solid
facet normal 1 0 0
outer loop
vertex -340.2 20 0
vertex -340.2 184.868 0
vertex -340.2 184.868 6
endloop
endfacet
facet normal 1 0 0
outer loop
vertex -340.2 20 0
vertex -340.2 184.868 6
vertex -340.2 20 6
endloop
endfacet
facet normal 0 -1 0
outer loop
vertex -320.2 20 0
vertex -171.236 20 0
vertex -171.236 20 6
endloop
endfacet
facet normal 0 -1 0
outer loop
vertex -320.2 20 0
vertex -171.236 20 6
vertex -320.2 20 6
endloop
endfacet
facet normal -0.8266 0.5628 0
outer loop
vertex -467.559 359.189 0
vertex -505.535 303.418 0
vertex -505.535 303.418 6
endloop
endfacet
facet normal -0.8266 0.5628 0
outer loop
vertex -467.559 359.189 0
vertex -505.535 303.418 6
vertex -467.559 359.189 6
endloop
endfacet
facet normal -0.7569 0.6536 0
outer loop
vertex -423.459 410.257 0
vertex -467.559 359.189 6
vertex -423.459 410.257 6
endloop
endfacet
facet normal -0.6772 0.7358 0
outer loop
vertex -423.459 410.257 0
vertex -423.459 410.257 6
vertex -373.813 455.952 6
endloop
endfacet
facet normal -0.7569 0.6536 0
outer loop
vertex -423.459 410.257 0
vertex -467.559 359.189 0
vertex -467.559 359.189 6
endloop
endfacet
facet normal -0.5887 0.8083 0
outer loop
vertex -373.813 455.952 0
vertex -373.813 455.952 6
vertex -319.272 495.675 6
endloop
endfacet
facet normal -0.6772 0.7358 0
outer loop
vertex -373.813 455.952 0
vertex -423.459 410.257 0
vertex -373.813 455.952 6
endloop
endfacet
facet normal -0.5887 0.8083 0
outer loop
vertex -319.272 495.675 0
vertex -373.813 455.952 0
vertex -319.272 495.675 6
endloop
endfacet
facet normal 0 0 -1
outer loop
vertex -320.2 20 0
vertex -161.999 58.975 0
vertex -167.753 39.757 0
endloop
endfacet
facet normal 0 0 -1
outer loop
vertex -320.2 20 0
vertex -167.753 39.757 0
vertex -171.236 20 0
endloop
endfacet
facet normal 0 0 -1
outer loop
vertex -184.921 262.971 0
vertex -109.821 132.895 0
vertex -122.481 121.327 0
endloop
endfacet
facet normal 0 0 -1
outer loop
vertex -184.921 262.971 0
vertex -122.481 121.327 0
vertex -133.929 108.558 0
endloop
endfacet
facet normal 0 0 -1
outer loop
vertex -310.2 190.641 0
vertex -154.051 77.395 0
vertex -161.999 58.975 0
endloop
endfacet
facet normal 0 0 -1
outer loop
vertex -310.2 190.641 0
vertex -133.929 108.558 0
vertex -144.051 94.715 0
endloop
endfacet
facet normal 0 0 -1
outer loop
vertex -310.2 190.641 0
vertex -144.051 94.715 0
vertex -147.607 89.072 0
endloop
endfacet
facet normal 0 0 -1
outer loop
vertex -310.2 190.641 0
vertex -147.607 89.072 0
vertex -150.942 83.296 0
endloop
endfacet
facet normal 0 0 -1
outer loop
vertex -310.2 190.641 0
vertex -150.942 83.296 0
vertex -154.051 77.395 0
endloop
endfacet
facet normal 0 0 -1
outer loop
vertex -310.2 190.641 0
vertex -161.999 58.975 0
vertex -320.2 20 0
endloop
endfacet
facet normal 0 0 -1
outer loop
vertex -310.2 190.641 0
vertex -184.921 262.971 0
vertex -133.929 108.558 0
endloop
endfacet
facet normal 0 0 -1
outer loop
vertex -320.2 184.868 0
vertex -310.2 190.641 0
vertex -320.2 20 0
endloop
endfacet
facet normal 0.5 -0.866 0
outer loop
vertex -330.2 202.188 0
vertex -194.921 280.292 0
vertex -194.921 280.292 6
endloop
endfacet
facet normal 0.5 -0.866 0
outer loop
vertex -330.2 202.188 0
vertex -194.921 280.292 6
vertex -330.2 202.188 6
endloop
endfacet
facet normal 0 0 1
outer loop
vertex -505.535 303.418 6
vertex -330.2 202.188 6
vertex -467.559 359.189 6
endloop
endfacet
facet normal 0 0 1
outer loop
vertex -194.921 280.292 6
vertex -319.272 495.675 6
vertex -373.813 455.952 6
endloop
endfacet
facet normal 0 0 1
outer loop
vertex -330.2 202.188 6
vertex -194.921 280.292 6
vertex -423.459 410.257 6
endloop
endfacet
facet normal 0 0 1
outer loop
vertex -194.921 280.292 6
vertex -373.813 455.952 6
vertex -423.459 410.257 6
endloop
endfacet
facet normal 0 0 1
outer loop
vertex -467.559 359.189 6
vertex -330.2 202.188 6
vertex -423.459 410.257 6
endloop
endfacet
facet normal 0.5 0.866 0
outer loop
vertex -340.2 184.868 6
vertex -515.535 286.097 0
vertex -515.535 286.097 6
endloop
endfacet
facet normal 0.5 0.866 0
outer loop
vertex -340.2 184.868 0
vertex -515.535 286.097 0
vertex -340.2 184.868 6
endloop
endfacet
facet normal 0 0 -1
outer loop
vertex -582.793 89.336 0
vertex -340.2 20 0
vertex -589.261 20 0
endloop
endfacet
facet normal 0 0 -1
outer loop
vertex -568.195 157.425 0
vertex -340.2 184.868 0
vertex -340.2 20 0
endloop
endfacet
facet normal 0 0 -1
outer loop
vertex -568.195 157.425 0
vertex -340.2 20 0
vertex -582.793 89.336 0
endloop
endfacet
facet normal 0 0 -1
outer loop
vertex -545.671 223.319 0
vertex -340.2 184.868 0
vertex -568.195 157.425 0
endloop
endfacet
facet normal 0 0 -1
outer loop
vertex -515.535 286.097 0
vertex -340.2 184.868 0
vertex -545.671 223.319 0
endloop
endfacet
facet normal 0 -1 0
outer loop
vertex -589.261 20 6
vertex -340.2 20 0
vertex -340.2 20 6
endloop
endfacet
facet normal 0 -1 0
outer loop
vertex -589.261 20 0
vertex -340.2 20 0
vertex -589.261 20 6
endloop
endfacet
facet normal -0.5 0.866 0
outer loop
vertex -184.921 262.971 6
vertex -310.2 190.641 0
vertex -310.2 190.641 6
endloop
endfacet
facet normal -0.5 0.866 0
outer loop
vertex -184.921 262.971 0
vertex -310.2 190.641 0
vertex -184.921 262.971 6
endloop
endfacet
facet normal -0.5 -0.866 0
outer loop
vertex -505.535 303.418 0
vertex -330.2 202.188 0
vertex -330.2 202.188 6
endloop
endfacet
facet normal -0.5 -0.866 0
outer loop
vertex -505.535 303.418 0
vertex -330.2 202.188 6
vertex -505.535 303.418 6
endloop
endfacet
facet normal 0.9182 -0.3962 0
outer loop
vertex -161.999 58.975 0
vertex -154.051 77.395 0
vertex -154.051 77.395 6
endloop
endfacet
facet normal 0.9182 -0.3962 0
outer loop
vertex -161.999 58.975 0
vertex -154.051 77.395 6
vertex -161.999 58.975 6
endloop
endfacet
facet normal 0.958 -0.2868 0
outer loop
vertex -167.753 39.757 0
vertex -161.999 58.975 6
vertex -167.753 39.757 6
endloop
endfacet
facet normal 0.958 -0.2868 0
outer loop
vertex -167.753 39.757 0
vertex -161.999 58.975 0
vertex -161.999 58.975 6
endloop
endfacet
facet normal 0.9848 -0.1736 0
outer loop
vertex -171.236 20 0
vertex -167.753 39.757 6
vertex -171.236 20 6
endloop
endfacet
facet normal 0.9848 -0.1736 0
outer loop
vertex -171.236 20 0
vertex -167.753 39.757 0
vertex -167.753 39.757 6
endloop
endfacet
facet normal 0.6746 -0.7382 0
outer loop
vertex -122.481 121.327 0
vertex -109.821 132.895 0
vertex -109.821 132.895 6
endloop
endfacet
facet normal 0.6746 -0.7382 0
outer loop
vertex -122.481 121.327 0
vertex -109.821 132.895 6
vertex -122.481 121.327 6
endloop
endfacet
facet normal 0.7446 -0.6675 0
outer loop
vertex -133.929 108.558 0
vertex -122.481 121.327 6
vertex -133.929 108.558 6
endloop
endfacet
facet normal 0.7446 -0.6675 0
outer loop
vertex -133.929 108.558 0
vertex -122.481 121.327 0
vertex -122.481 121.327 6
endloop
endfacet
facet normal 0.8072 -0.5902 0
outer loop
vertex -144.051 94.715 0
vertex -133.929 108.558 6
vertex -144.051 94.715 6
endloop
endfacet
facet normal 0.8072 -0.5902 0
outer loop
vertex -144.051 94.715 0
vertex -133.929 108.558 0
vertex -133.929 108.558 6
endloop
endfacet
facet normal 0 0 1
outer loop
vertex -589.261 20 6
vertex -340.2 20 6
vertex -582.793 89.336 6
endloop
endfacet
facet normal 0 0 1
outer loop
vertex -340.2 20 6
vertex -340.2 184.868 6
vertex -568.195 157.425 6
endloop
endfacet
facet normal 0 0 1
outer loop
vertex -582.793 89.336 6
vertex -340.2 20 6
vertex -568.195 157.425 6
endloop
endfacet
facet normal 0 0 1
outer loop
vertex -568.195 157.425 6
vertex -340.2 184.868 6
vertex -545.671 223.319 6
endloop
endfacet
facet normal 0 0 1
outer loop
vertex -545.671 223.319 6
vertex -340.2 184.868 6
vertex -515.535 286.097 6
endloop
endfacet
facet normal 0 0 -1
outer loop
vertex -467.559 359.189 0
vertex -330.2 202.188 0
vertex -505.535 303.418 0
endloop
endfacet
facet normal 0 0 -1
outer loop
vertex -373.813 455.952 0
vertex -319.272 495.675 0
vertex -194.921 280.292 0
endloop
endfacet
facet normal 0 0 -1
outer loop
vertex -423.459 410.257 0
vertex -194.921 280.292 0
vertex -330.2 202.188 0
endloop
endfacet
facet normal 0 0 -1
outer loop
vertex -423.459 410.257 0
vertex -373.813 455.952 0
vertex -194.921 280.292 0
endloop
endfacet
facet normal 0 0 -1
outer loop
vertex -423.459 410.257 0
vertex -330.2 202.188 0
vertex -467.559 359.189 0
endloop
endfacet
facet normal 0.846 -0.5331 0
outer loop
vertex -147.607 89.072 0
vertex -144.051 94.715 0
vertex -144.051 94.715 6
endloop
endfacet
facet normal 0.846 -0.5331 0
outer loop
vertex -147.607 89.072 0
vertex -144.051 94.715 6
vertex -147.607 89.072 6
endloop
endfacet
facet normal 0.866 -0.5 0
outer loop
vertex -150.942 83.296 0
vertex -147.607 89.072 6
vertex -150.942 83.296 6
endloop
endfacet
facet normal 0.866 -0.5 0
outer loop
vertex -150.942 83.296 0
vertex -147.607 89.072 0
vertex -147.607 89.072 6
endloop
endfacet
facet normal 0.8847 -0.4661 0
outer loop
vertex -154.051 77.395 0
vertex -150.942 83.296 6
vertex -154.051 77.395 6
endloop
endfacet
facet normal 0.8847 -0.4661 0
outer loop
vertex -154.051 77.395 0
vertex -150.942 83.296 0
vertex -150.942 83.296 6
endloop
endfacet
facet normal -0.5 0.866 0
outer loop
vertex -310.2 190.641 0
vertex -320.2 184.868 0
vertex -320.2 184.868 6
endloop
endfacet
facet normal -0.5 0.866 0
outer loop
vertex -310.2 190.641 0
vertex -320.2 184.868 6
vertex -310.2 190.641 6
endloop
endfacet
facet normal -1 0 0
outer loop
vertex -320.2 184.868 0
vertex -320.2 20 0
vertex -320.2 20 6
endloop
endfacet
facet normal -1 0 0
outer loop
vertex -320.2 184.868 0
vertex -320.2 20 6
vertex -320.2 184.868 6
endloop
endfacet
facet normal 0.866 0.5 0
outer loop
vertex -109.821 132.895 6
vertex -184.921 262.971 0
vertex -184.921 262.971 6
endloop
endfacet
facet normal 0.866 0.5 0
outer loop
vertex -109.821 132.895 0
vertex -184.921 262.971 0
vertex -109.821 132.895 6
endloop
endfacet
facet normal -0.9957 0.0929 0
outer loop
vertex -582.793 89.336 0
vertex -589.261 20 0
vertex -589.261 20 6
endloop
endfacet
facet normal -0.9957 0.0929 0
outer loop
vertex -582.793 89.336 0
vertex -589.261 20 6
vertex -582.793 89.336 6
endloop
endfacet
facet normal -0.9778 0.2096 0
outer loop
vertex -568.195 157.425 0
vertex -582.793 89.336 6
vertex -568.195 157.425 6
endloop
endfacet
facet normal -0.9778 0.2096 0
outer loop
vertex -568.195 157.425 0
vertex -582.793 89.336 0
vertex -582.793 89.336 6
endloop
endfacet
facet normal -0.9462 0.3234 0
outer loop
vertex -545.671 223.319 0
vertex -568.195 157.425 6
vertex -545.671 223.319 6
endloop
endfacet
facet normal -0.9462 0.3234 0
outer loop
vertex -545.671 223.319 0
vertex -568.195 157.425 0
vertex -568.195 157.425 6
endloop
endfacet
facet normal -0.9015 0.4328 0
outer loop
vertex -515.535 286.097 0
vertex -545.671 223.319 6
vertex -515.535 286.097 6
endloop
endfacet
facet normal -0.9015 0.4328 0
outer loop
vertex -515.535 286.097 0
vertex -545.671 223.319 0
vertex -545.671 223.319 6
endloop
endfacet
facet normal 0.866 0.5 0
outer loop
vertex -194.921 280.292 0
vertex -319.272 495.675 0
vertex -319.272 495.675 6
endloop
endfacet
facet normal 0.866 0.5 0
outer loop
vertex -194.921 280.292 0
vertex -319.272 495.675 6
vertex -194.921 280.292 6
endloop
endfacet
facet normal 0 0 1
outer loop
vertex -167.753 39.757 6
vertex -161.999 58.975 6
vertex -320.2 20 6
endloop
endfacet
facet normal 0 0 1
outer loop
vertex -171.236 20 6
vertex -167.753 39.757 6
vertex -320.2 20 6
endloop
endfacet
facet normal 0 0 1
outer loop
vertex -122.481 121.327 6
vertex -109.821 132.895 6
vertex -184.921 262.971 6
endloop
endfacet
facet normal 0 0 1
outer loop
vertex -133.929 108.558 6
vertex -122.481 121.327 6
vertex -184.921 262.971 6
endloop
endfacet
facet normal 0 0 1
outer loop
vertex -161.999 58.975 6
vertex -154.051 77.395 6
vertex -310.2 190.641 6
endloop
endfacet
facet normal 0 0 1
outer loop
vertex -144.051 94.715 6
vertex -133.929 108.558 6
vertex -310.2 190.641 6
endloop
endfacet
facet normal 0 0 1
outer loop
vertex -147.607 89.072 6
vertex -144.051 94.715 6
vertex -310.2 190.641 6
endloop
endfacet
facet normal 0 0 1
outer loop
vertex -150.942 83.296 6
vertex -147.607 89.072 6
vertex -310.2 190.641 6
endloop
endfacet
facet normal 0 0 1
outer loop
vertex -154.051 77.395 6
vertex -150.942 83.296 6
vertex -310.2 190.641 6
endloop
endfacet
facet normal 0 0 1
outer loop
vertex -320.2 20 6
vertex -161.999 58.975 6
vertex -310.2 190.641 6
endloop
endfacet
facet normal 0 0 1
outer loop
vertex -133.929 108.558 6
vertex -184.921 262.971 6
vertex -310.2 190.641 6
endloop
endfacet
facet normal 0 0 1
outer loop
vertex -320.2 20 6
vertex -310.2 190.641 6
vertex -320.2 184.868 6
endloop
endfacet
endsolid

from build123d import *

# Parameters (mm, degrees)
BOSS_EXTRUDE1_DEPTH   = 6
BOSS_EXTRUDE1_2_DEPTH = 6
BOSS_EXTRUDE1_3_DEPTH = 6


with BuildPart() as part:
    # Sketch1 → Boss-Extrude1 (new body)
    with BuildSketch(Plane.XY):
        with BuildLine():
            ThreePointArc((-589.260689339, 20), (-568.194860877, 157.425411141), (-515.535131015, 286.097341284))
            Line((-515.535131015, 286.097341284), (-340.2, 184.867556195))
            Line((-340.2, 184.867556195), (-340.2, 20))
            Line((-340.2, 20), (-589.260689339, 20))
        make_face()
    extrude(amount=BOSS_EXTRUDE1_DEPTH)


with BuildPart() as body_2:
    # Sketch1 → Boss-Extrude1 2 (new body)
    with BuildSketch(Plane.XY):
        with BuildLine():
            ThreePointArc((-505.535131015, 303.41784936), (-423.458843967, 410.256952977), (-319.272010805, 495.674836073))
            Line((-319.272010805, 495.674836073), (-194.920508076, 280.291715349))
            Line((-194.920508076, 280.291715349), (-330.2, 202.18806427))
            Line((-330.2, 202.18806427), (-505.535131015, 303.41784936))
        make_face()
    extrude(amount=BOSS_EXTRUDE1_2_DEPTH)


with BuildPart() as body_3:
    # Sketch1 → Boss-Extrude1 3 (new body)
    with BuildSketch(Plane.XY):
        with BuildLine():
            ThreePointArc((-154.05140053, 77.394612181), (-165.156001883, 49.449520141), (-171.235977528, 20))
            Line((-171.235977528, 20), (-320.2, 20))
            Line((-320.2, 20), (-320.2, 173.320550811))
            Line((-320.2, 173.320550811), (-320.2, 184.867556195))
            Line((-320.2, 184.867556195), (-310.2, 190.641058886))
            Line((-310.2, 190.641058886), (-184.920508076, 262.971207273))
            Line((-184.920508076, 262.971207273), (-109.821022542, 132.895082707))
            ThreePointArc((-109.821022542, 132.895082707), (-128.363659898, 115.08488527), (-144.05140053, 94.715120257))
            ThreePointArc((-144.05140053, 94.715120257), (-149.302779612, 86.2), (-154.05140053, 77.394612181))
        make_face()
    extrude(amount=BOSS_EXTRUDE1_3_DEPTH)


solid = Compound([part.part, body_2.part, body_3.part])
